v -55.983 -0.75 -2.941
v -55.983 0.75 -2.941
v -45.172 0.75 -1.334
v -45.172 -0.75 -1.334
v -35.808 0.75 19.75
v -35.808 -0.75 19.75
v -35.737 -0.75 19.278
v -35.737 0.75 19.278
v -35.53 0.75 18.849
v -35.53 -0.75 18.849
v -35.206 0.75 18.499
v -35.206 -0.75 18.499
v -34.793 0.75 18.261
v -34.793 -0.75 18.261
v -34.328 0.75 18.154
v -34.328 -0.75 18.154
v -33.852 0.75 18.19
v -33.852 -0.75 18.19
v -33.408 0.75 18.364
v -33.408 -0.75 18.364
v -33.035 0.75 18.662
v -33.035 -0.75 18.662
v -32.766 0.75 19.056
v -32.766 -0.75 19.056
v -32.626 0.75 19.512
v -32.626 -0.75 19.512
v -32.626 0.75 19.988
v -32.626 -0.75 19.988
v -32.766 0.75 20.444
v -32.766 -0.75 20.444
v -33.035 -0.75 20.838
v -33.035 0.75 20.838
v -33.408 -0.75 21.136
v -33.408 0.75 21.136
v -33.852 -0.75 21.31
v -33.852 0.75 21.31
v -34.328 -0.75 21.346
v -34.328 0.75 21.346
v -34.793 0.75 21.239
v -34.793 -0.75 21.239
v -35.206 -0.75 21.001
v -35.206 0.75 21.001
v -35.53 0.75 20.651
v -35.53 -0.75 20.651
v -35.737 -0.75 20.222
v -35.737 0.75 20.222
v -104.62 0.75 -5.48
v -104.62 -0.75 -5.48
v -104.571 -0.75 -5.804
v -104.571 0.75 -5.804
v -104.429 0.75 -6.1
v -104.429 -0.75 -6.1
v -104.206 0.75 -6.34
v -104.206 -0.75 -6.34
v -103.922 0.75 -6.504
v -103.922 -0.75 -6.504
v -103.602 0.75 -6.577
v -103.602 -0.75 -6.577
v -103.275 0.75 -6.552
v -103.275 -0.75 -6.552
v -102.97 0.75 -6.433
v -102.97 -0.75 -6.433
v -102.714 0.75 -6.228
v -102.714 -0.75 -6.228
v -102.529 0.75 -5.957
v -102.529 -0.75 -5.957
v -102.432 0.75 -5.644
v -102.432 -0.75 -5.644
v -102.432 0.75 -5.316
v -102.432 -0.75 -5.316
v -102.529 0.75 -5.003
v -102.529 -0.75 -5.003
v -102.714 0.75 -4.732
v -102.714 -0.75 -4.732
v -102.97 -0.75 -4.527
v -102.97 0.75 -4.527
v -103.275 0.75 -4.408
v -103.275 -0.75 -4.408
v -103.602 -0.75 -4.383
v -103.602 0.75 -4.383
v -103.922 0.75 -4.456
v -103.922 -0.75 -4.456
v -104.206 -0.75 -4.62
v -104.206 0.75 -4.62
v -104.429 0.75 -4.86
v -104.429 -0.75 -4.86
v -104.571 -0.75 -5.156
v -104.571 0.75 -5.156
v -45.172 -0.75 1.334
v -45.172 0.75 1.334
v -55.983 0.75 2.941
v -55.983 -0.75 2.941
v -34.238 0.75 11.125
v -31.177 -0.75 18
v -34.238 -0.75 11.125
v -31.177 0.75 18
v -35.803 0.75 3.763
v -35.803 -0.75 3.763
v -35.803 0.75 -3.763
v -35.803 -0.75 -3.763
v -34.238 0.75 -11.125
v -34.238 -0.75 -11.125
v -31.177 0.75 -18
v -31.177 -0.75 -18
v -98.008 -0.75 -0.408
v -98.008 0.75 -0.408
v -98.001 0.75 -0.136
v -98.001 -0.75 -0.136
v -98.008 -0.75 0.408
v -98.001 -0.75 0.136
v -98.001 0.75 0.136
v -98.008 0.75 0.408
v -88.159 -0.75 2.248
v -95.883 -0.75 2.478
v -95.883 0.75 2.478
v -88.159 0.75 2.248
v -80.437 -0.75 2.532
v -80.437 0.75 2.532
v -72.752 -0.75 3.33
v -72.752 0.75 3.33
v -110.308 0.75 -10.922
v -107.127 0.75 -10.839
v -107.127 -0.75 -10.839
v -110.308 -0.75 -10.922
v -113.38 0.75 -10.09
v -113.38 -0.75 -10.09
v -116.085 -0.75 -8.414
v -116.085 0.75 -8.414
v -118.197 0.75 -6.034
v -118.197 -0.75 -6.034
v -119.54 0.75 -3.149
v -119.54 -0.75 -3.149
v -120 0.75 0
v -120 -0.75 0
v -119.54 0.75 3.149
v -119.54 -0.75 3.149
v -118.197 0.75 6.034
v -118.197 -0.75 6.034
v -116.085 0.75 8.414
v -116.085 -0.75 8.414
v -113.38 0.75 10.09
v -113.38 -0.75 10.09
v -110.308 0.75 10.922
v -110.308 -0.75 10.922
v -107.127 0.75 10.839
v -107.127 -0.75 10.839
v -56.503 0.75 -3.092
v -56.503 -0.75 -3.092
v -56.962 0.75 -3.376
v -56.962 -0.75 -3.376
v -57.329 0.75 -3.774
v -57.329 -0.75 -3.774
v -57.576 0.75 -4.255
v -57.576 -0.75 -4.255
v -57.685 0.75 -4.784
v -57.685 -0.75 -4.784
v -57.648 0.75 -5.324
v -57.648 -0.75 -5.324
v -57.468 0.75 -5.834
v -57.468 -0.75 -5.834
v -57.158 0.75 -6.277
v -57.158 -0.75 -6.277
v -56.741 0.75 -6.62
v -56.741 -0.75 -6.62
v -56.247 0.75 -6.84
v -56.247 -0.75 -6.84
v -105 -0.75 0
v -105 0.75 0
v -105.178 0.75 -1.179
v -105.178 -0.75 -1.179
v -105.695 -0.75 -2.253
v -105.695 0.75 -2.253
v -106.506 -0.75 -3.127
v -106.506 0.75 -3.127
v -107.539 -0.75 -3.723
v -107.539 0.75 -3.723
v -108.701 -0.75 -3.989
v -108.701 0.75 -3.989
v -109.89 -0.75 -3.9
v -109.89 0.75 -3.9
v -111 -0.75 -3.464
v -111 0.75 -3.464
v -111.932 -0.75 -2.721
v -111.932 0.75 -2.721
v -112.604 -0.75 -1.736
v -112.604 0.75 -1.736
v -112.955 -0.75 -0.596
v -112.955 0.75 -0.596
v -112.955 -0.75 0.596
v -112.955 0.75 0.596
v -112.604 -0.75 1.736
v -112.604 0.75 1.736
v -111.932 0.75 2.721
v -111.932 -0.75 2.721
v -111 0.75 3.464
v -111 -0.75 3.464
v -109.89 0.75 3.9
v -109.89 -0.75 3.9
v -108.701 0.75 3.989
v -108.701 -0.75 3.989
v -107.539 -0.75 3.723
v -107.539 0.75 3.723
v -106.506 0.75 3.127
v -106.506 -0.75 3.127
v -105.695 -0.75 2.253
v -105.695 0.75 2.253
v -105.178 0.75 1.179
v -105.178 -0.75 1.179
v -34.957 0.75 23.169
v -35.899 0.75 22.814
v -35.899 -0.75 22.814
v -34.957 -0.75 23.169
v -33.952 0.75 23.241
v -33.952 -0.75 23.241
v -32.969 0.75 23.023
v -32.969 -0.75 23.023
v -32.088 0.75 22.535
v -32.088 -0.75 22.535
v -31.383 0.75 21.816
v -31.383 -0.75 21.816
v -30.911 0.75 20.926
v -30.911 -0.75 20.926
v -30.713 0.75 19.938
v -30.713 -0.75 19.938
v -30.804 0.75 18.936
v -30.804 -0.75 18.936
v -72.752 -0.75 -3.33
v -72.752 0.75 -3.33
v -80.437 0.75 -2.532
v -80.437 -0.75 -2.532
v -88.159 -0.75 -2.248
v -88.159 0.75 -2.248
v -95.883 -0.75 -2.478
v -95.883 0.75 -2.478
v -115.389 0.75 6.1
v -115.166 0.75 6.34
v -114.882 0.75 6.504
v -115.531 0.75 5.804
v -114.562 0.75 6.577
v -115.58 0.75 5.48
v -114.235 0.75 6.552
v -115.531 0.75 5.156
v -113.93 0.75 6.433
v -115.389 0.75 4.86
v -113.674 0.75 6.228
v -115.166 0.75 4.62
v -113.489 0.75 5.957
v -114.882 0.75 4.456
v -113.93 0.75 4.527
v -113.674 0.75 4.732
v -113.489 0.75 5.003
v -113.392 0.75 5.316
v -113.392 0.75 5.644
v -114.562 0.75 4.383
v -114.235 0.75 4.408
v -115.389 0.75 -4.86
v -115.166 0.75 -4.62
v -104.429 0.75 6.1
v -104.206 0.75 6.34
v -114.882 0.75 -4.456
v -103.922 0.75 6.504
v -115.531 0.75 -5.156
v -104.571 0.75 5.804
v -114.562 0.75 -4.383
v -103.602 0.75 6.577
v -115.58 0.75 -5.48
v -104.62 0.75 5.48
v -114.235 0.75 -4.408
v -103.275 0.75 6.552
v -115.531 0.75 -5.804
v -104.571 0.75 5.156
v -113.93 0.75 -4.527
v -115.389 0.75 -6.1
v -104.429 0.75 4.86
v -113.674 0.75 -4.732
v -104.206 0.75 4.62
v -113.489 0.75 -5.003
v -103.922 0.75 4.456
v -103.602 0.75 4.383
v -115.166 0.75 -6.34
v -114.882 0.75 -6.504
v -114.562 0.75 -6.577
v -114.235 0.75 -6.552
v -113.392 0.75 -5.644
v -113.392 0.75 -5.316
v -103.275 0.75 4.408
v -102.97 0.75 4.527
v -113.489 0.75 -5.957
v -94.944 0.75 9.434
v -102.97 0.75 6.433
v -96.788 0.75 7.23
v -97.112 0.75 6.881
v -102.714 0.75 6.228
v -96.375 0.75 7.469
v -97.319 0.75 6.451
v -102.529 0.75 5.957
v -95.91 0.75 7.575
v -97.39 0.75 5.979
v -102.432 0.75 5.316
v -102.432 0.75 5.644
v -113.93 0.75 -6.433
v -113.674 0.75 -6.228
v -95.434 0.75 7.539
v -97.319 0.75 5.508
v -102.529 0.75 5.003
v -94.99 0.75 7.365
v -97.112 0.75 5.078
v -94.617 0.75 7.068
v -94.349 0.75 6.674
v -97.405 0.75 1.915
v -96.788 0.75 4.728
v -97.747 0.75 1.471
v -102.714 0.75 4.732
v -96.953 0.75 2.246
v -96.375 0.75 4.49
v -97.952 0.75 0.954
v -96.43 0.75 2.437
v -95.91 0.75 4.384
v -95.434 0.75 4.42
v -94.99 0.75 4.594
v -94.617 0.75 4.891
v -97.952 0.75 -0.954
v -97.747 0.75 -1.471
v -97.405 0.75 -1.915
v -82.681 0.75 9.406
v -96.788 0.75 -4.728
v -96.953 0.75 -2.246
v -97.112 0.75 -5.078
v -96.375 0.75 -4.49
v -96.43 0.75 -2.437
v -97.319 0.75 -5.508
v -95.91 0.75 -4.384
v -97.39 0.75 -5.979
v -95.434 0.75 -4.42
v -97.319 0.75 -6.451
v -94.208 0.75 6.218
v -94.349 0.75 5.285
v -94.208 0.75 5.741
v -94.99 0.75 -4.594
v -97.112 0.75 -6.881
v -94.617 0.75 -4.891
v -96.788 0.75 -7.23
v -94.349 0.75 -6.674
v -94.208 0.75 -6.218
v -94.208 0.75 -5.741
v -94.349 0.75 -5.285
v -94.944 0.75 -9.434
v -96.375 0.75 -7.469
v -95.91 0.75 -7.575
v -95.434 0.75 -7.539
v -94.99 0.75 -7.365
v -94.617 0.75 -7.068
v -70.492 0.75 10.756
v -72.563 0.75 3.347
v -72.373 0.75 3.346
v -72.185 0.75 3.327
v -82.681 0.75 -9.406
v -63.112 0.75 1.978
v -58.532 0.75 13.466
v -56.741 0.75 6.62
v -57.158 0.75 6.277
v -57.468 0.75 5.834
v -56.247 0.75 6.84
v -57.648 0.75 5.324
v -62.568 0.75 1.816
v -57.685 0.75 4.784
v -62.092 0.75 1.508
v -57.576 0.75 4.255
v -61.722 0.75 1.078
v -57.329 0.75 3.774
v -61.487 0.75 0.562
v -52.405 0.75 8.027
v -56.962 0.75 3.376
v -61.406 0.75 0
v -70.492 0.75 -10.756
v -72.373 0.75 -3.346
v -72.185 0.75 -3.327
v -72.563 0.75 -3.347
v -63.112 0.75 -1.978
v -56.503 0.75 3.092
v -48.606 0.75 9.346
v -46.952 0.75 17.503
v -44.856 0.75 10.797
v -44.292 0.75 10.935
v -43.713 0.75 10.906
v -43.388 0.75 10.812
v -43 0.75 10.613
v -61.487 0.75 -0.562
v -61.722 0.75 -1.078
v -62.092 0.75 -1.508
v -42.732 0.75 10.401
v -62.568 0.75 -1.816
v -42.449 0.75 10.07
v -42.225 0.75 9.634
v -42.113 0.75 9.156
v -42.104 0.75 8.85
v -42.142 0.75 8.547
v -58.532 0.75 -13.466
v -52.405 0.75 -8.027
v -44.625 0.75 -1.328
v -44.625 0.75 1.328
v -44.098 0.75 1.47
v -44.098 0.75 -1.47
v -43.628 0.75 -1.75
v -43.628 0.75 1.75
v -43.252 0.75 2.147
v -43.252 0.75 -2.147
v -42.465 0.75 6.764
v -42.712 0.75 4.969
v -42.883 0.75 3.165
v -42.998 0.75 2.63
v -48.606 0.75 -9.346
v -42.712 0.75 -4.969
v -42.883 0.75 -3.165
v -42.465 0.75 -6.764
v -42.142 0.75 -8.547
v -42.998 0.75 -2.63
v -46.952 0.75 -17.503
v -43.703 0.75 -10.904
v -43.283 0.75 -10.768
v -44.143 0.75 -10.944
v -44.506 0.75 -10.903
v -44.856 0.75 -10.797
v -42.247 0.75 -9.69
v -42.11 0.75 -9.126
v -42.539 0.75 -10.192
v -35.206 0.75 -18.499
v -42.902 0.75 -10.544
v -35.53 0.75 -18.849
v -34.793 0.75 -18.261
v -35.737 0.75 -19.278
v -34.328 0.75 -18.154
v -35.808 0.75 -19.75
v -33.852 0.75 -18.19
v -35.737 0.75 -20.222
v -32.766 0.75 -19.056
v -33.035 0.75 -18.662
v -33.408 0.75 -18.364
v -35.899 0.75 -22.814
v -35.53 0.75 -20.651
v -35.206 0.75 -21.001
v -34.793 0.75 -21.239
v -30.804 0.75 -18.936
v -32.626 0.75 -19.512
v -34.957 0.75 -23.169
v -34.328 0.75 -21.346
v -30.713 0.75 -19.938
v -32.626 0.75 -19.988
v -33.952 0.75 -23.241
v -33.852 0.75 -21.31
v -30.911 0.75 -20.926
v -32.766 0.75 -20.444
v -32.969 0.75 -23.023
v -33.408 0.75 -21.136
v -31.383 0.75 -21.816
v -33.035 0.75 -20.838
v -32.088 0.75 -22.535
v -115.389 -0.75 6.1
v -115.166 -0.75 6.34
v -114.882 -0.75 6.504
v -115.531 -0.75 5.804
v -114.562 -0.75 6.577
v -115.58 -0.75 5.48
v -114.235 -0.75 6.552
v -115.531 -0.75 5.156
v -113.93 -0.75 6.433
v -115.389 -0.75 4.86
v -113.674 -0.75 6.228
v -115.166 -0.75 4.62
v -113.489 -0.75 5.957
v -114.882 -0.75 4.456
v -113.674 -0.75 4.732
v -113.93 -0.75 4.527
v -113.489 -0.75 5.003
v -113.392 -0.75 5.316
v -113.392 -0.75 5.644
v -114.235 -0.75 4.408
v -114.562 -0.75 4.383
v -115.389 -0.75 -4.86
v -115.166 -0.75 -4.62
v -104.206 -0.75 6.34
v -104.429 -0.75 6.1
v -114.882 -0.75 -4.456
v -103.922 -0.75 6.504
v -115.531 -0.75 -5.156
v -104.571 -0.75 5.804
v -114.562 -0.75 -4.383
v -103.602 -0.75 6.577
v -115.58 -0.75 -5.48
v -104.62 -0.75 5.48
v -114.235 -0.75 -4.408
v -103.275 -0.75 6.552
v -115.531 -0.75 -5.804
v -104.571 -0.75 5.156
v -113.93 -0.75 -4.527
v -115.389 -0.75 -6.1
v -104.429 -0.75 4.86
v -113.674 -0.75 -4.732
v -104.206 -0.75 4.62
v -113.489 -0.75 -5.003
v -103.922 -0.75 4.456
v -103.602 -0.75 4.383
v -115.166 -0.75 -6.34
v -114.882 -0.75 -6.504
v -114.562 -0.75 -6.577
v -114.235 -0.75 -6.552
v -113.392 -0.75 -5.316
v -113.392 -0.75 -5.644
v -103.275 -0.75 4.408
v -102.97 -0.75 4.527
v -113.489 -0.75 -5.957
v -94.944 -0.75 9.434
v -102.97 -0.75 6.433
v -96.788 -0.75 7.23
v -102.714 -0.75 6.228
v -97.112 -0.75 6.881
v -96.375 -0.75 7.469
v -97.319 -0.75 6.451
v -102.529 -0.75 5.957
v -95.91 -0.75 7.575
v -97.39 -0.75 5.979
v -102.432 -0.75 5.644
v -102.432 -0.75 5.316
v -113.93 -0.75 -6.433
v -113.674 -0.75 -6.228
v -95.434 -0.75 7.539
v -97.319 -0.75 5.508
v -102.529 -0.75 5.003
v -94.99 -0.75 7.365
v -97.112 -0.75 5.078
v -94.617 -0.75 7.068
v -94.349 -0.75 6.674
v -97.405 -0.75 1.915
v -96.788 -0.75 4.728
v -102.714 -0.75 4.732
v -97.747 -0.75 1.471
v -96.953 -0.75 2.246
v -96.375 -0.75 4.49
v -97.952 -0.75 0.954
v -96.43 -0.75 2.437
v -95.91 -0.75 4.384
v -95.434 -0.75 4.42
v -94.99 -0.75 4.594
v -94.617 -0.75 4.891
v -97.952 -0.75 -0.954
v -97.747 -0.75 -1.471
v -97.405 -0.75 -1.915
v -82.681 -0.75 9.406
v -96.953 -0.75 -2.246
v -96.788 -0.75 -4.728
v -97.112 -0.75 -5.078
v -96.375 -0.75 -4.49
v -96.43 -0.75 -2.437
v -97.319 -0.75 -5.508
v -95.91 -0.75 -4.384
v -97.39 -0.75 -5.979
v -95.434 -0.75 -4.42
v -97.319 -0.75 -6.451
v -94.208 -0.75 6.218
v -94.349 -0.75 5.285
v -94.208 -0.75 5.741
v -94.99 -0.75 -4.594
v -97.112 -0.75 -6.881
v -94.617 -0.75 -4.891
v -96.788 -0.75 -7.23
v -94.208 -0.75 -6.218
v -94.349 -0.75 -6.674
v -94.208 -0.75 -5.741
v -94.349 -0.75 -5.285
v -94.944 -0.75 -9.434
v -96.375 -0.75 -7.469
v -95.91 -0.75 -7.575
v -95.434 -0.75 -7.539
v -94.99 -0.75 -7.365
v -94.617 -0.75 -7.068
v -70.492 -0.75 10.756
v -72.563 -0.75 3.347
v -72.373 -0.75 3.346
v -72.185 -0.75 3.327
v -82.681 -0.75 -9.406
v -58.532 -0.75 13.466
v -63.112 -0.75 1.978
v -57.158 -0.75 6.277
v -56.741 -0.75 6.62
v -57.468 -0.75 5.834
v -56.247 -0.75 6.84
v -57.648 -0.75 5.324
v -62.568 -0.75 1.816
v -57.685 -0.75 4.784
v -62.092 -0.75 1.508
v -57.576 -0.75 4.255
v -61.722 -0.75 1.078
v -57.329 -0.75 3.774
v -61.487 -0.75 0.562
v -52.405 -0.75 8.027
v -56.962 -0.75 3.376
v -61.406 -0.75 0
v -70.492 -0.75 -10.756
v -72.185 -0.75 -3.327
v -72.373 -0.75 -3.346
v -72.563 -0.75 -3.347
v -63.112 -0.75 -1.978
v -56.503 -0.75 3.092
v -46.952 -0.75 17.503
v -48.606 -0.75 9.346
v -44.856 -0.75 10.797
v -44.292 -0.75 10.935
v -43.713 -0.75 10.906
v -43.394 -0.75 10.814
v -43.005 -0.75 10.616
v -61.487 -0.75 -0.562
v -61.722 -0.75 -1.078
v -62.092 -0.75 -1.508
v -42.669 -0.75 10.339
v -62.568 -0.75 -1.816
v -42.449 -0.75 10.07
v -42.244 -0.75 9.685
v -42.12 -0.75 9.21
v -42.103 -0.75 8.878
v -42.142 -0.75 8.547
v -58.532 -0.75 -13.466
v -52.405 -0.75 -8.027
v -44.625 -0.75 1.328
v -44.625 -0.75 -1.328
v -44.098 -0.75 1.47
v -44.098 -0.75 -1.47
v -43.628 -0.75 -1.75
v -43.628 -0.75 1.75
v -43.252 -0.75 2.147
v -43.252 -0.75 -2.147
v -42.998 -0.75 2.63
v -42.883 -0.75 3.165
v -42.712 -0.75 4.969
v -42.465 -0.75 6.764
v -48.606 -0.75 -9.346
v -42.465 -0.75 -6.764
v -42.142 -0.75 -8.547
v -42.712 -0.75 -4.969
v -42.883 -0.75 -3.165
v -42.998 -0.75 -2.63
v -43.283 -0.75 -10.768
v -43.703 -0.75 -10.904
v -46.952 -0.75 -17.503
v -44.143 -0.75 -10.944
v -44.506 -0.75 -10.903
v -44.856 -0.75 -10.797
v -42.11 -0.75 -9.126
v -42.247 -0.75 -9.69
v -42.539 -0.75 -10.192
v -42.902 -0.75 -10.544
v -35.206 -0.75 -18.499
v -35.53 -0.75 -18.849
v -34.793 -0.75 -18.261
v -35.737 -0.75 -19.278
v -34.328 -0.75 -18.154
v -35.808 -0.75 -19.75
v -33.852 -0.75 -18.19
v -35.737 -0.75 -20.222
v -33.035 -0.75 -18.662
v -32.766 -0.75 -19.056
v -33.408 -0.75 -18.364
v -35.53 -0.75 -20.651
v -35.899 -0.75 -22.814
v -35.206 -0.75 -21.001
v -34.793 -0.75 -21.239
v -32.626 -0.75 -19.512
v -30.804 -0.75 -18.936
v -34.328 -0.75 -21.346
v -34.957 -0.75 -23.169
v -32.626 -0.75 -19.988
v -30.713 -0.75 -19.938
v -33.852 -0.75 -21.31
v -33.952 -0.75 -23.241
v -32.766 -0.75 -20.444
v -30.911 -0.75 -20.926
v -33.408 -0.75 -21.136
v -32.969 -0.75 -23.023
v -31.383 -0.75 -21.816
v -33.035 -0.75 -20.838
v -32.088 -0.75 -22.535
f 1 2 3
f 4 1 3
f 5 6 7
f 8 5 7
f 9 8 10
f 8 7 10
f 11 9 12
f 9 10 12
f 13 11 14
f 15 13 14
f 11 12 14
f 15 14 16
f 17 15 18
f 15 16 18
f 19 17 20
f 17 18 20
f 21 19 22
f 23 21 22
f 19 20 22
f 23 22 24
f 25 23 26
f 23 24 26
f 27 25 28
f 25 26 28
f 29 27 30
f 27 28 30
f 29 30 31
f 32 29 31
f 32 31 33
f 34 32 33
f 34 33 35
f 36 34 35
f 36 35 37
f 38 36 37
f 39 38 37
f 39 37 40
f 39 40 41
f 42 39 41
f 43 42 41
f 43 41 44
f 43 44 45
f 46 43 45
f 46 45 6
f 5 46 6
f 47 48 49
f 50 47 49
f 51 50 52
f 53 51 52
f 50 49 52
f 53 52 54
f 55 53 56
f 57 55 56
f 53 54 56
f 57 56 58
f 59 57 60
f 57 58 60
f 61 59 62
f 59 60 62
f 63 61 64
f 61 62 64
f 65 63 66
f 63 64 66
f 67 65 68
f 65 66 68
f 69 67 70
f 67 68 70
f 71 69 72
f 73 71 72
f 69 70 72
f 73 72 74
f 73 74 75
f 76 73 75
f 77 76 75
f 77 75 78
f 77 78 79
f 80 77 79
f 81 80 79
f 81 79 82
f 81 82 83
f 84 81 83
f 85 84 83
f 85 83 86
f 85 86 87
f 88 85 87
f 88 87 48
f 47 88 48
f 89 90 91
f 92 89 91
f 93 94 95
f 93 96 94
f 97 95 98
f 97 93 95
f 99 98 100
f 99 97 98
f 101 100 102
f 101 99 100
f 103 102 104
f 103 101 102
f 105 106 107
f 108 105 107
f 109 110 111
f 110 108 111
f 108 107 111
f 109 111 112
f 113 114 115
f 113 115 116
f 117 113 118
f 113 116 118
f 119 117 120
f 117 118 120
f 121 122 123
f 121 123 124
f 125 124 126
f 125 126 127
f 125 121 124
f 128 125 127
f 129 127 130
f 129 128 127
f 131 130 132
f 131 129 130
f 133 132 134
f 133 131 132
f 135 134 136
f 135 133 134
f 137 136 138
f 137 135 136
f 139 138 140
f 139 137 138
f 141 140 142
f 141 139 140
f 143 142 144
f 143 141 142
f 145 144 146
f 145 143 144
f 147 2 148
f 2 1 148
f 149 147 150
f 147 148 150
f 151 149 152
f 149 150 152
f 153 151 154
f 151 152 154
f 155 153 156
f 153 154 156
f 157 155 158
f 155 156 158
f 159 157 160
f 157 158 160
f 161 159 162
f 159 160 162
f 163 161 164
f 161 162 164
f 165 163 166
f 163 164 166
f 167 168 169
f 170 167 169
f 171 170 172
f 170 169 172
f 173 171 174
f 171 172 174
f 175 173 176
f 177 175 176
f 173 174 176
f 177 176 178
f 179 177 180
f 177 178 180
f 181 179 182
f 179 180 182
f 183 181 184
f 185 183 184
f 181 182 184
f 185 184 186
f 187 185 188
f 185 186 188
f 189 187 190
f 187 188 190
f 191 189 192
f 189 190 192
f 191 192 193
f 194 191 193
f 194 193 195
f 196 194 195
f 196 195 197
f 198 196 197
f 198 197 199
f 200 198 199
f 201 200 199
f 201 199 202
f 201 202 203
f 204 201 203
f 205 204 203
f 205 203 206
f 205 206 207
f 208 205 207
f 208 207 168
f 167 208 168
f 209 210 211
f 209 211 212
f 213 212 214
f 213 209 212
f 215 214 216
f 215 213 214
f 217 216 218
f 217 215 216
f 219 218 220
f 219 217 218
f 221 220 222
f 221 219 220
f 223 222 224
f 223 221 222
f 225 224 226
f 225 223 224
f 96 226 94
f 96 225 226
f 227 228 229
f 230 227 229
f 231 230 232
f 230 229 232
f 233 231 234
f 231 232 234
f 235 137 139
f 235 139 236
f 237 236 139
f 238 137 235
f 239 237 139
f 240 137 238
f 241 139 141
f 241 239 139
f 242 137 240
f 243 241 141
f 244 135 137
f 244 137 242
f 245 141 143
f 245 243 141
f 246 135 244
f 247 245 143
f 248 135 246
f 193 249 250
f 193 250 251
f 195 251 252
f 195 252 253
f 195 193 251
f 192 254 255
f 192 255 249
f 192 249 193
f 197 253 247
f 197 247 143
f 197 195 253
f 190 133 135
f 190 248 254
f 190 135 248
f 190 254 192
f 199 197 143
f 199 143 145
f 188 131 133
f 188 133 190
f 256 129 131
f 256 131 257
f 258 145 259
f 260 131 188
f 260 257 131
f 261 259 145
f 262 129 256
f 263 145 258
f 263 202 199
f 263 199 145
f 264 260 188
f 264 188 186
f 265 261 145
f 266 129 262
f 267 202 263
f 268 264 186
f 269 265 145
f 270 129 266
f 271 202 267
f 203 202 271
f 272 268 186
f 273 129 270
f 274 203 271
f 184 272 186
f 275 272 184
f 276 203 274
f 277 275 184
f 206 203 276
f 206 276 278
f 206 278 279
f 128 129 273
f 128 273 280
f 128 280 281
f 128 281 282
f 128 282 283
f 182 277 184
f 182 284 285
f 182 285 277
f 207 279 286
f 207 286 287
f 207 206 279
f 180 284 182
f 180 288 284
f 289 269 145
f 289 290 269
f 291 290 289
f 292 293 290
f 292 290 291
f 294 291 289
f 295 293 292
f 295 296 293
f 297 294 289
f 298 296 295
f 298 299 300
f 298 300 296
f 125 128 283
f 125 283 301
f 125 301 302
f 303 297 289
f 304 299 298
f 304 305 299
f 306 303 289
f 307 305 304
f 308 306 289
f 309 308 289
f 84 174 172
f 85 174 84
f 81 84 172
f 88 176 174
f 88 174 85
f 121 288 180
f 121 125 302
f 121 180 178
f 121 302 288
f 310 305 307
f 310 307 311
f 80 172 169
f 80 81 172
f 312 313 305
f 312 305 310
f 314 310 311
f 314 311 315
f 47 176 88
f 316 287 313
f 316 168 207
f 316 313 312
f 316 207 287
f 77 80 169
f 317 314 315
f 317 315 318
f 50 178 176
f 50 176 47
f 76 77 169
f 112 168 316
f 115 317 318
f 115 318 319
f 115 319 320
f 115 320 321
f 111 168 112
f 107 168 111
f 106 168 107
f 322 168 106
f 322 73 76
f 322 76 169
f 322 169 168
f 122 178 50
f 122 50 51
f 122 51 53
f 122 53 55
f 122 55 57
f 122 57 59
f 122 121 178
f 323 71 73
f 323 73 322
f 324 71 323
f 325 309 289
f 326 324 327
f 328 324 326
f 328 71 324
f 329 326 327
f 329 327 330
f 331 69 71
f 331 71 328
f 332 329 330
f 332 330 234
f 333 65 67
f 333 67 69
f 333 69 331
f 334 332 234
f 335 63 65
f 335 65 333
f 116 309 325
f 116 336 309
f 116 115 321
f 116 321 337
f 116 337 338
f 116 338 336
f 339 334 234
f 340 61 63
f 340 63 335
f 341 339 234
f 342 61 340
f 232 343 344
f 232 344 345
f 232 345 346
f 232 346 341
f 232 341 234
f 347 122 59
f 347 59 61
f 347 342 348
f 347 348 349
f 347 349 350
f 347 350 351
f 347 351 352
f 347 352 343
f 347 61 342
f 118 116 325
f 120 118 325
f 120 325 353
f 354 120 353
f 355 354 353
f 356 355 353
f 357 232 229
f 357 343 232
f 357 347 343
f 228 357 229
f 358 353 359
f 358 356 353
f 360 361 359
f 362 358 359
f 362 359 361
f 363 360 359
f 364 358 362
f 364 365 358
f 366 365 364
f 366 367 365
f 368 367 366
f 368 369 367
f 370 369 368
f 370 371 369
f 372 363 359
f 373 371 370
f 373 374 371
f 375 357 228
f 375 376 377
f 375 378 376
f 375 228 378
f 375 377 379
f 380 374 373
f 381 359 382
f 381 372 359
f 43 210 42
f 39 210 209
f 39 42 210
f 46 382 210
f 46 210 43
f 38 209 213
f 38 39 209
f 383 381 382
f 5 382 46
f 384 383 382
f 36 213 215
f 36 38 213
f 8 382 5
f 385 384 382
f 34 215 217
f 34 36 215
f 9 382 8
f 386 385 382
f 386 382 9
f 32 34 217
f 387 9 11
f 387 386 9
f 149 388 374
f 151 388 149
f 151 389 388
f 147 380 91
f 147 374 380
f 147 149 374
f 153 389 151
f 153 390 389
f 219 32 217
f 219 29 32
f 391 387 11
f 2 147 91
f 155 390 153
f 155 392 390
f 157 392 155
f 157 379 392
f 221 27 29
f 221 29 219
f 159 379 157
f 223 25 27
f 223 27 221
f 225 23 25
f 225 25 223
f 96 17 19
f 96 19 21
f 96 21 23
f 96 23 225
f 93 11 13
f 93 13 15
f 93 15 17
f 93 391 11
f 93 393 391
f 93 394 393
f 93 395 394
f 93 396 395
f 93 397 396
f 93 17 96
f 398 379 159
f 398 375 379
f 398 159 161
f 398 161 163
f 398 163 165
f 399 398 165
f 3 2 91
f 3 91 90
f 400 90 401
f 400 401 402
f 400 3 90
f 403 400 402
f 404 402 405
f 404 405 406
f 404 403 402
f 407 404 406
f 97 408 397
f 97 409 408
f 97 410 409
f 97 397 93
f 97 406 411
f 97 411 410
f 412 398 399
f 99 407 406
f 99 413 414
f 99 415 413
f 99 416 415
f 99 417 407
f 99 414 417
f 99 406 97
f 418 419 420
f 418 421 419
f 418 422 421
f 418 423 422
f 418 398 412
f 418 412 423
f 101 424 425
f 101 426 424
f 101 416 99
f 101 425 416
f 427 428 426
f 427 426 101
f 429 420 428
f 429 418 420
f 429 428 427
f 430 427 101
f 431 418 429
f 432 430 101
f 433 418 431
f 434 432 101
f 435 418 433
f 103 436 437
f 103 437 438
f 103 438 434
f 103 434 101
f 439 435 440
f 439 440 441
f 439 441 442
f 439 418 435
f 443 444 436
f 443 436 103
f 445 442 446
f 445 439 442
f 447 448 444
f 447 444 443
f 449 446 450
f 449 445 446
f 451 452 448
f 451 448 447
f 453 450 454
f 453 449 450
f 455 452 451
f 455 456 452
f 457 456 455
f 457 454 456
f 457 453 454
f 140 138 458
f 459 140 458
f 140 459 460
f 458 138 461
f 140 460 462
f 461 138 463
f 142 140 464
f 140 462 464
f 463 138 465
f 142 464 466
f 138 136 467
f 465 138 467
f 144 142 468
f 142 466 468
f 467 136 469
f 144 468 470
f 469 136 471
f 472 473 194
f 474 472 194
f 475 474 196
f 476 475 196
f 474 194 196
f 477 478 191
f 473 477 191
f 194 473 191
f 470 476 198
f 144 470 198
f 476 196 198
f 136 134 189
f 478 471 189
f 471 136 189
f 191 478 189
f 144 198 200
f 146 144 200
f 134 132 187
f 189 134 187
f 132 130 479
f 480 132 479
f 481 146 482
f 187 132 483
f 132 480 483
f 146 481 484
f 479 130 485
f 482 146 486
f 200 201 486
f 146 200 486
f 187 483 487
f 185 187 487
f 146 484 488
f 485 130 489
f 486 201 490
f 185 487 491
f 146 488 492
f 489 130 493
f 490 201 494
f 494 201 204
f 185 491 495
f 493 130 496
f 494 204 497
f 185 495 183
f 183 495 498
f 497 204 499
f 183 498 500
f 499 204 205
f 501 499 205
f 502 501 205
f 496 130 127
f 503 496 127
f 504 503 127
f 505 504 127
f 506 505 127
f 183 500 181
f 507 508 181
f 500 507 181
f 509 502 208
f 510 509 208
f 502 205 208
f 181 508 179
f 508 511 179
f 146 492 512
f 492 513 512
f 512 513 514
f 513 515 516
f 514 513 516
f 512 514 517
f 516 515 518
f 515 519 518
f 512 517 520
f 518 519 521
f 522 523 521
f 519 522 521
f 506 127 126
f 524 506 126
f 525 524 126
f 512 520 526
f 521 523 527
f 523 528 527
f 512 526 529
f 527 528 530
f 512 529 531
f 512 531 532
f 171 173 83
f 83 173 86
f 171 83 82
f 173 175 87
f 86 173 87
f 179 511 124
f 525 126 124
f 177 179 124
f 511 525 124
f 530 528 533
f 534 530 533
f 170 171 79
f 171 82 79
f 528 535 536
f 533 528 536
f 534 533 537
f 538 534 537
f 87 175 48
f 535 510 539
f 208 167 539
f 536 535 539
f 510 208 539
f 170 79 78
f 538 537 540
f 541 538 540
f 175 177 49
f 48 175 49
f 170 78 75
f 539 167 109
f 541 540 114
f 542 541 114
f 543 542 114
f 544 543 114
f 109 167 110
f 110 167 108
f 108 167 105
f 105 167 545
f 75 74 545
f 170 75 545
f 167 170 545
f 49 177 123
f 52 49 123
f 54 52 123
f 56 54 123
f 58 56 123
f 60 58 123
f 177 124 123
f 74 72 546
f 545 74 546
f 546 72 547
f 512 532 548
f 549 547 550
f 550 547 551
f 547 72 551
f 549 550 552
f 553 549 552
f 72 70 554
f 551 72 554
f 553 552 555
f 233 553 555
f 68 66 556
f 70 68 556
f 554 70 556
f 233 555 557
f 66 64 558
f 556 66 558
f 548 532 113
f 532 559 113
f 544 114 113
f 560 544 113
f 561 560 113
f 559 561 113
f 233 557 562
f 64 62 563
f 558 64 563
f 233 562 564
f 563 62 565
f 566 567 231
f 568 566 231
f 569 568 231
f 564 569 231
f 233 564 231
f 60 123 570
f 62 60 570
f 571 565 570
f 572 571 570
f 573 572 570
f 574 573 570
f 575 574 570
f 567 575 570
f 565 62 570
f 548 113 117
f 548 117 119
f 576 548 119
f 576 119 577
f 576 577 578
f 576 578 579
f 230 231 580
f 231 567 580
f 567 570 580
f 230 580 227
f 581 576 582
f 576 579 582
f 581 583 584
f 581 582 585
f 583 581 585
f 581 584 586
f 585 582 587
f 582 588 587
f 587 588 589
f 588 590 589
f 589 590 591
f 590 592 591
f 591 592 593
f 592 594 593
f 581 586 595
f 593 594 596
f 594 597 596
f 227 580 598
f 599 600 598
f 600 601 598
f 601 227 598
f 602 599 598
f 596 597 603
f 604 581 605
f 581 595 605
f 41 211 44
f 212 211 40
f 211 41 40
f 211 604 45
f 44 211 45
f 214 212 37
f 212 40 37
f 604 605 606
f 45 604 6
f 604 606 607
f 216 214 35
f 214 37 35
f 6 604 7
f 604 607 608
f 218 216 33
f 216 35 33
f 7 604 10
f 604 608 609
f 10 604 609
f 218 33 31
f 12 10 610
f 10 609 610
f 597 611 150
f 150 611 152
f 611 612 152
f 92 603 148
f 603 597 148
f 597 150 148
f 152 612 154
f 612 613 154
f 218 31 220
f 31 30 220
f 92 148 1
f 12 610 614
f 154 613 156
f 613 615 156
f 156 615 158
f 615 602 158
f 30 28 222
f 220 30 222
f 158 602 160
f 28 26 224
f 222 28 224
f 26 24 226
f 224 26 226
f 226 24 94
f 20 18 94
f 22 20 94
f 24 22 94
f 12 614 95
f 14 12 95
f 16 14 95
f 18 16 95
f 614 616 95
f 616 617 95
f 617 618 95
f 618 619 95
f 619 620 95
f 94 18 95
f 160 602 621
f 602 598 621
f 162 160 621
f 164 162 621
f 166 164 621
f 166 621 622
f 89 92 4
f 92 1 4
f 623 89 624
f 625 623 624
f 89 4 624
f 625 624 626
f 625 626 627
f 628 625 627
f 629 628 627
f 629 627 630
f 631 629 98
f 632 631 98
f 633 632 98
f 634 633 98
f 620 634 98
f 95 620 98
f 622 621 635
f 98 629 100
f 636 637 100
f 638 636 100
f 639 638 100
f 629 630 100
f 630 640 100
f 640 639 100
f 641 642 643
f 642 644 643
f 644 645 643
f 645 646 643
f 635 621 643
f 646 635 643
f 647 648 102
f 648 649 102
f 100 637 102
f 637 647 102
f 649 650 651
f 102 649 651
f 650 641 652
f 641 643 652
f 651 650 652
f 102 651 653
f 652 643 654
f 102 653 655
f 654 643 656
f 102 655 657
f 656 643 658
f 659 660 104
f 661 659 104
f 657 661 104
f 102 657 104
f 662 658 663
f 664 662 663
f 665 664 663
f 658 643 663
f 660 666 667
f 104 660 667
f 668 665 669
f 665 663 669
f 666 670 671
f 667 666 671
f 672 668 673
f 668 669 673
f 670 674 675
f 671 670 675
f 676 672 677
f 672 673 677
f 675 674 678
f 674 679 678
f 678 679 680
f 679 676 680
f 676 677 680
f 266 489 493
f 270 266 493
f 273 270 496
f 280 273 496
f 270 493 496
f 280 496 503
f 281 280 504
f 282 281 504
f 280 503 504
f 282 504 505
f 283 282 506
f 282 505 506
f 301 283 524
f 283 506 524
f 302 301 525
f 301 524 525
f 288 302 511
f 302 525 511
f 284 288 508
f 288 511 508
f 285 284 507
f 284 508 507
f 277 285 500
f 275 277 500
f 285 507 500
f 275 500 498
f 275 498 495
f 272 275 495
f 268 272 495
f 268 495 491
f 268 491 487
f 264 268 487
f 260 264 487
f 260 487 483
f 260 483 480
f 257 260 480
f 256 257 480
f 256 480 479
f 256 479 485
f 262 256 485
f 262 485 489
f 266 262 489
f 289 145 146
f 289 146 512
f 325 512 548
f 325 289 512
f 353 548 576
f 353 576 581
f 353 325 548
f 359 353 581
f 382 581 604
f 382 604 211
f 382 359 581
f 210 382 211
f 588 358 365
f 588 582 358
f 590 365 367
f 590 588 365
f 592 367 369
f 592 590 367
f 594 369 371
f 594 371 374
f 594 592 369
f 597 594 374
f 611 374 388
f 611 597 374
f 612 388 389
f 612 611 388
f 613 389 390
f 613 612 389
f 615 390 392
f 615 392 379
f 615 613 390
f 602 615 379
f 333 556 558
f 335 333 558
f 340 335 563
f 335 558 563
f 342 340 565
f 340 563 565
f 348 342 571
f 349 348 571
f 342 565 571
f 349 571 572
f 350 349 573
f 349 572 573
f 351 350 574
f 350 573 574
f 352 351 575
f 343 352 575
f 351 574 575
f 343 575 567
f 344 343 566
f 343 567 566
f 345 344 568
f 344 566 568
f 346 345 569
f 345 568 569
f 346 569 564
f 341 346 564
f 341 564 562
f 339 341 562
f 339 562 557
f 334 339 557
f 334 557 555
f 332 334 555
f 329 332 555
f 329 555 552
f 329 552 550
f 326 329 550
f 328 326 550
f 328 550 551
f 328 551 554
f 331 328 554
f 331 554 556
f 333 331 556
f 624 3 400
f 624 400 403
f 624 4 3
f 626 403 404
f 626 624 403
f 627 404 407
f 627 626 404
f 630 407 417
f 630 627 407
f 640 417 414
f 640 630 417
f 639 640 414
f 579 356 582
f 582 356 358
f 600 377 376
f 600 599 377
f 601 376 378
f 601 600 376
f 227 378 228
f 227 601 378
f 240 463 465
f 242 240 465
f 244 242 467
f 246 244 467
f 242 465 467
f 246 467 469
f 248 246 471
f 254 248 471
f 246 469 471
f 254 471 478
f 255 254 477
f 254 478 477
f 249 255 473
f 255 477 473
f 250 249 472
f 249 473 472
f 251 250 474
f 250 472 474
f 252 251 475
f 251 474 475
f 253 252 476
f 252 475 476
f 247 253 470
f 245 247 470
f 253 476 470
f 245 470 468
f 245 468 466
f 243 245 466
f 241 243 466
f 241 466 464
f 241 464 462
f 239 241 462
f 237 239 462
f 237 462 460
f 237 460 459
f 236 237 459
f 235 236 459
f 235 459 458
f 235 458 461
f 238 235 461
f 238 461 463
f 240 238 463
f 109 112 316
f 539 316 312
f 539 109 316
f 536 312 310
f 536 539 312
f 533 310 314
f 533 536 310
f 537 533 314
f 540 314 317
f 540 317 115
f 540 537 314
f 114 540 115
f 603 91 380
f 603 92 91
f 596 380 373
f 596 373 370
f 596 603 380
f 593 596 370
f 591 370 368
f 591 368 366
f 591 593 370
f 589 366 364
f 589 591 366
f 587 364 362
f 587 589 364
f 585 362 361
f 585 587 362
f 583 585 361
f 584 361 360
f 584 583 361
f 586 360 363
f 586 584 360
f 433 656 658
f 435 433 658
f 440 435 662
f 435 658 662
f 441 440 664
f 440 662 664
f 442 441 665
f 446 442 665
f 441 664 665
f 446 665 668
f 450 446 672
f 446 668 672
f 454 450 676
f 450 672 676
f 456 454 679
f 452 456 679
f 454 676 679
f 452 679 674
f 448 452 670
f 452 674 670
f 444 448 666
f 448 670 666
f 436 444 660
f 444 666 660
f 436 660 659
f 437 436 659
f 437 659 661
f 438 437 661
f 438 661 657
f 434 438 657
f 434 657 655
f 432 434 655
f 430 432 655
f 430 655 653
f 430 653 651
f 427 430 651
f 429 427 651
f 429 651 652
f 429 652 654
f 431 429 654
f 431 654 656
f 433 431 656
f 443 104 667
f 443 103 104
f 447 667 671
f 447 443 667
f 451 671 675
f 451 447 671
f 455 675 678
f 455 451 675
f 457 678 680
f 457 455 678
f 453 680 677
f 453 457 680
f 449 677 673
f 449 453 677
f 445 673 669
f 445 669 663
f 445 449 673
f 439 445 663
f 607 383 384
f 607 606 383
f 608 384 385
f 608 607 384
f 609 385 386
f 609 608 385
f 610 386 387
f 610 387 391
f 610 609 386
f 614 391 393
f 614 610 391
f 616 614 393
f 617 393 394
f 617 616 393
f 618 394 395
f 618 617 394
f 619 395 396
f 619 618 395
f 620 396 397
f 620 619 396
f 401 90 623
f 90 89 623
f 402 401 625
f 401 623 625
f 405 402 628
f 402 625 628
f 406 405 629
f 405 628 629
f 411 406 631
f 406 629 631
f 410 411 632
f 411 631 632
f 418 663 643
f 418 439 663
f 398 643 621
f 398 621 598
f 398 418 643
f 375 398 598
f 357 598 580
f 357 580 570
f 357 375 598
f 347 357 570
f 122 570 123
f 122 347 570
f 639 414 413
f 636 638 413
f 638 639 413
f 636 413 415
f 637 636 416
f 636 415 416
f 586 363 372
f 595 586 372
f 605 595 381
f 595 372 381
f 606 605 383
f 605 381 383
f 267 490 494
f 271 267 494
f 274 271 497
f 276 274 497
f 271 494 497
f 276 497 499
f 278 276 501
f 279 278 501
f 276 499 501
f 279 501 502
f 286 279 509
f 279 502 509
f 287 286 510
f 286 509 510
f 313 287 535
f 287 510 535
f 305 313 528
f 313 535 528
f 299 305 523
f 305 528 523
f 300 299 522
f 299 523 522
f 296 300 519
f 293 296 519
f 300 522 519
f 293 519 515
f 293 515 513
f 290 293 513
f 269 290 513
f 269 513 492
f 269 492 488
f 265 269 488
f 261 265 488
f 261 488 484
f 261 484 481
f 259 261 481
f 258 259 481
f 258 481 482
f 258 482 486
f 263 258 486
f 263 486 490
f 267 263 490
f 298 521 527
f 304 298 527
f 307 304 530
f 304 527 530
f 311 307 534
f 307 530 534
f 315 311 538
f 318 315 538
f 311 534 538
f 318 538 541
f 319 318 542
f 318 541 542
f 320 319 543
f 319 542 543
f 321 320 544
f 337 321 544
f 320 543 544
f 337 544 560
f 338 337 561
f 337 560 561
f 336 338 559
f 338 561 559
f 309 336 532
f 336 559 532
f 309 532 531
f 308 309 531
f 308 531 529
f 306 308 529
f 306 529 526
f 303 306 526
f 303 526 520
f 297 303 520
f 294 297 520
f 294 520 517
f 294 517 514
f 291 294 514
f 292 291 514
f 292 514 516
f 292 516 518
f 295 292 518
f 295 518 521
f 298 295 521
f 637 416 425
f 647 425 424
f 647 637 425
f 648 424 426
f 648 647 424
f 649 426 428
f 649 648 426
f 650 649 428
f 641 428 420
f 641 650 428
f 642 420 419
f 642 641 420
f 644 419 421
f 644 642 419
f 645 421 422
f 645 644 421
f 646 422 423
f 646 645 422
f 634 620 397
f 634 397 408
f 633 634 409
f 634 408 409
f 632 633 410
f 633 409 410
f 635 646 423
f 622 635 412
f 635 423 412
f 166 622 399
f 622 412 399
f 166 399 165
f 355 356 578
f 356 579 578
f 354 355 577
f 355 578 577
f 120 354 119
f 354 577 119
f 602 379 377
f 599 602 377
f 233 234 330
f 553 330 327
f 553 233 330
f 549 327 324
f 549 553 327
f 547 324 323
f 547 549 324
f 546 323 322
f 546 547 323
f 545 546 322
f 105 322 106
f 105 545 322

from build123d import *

# Parameters (mm, degrees)
SKETCH1_R                      = 3.5
BOSS_EXTRUDE1_DEPTH            = 0.75
F_2_2_2_2_DIAMETER_HOLE1_D     = 2.2
F_3_2_3_2_DIAMETER_HOLE1_D     = 3.2
F_3_2_3_2_DIAMETER_HOLE1_DEPTH = 10
F_3_2_3_2_DIAMETER_HOLE1_TIP   = 0.96137699
CUT_EXTRUDE1_DEPTH             = 2.5
FILLET1_R                      = 2
SKETCH7_R                      = 4
CUT_EXTRUDE2_DEPTH             = 2.5000001


with BuildPart() as part:
    # Sketch1 → Boss-Extrude1 (new body, symmetric)
    with BuildSketch(Plane(origin=(0, 0, 0), x_dir=(1, 0, 0), z_dir=(0, 1, 0))):
        with BuildLine():
            ThreePointArc((-37.239092363, -21.5), (-43, 0), (-37.239092363, 21.5))
            ThreePointArc((-37.239092363, 21.5), (-36.658838331, 22.248681329), (-35.899079455, 22.81435343))
            ThreePointArc((-35.899079455, 22.81435343), (-70.492179883, 10.7556392), (-107.126701642, 10.839315166))
            ThreePointArc((-107.126701642, 10.839315166), (-120, 0), (-107.126701642, -10.839315166))
            ThreePointArc((-107.126701642, -10.839315166), (-70.492179883, -10.7556392), (-35.899079455, -22.81435343))
            ThreePointArc((-35.899079455, -22.81435343), (-36.658838331, -22.248681329), (-37.239092363, -21.5))
        make_face()
        with BuildLine():
            ThreePointArc((-31.176914536, 18), (-35.958003449, 16.718911087), (-37.239092363, 21.5))
            ThreePointArc((-37.239092363, 21.5), (-43, 0), (-37.239092363, -21.5))
            ThreePointArc((-37.239092363, -21.5), (-35.958003449, -16.718911087), (-31.176914536, -18))
            ThreePointArc((-31.176914536, -18), (-36, 0), (-31.176914536, 18))
        make_face()
        with Locations((-34.208003449, -19.75)):
            Circle(SKETCH1_R)
        with Locations((-34.208003449, 19.75)):
            Circle(SKETCH1_R)
    extrude(amount=BOSS_EXTRUDE1_DEPTH, both=True)

    # Ø2.2 (2.2) Diameter Hole1 (through all)
    with Locations(Plane(origin=(0, 0.75, 0), x_dir=(1, 0, 0), z_dir=(0, 1, 0))):
        with Locations((-114.480077554, 5.480077554), (-103.519922446, 5.480077554), (-103.519922446, -5.480077554), (-114.480077554, -5.480077554)):
            Hole(F_2_2_2_2_DIAMETER_HOLE1_D / 2)

    # Ø3.2 (3.2) Diameter Hole1
    with Locations(Plane(origin=(0, 0.75, 0), x_dir=(1, 0, 0), z_dir=(0, 1, 0))):
        with Locations((-34.208003449, 19.75), (-34.208003449, -19.75), (-95.790276336, 5.979398024), (-95.790276336, -5.979398024)):
            Hole(F_3_2_3_2_DIAMETER_HOLE1_D / 2, depth=F_3_2_3_2_DIAMETER_HOLE1_DEPTH)
            with Locations((0, 0, -(F_3_2_3_2_DIAMETER_HOLE1_DEPTH + F_3_2_3_2_DIAMETER_HOLE1_TIP / 2))):  # 118° drill point
                Cone(0, F_3_2_3_2_DIAMETER_HOLE1_D / 2, F_3_2_3_2_DIAMETER_HOLE1_TIP, mode=Mode.SUBTRACT)

    # Sketch6 → Cut-Extrude1 (cut, through all)
    with BuildSketch(Plane(origin=(0, 0.75, 0), x_dir=(1, 0, 0), z_dir=(0, 1, 0))):
        with BuildLine():
            Line((-72.469338063, -3.369046694), (-49.802019621, 0))
            Line((-49.802019621, 0), (-72.469338063, 3.369046694))
            ThreePointArc((-72.469338063, 3.369046694), (-85.377857375, 2.290839769), (-98.326107181, 2.65857332))
            ThreePointArc((-98.326107181, 2.65857332), (-98, 0), (-98.326107181, -2.65857332))
            ThreePointArc((-98.326107181, -2.65857332), (-85.377857375, -2.290839769), (-72.469338063, -3.369046694))
        make_face()
        with BuildLine():
            Line((-66.096117167, 4.443764231), (-42.988154947, 1.009224591))
            ThreePointArc((-42.988154947, 1.009224591), (-42.467311238, 6.747405149), (-41.183985346, 12.36443897))
            ThreePointArc((-41.183985346, 12.36443897), (-53.416219701, 7.70010587), (-66.096117167, 4.443764231))
        make_face()
        with BuildLine():
            ThreePointArc((-41.183985346, -12.36443897), (-42.467311238, -6.747405149), (-42.988154947, -1.009224591))
            Line((-42.988154947, -1.009224591), (-66.096117167, -4.443764231))
            ThreePointArc((-66.096117167, -4.443764231), (-53.416219701, -7.70010587), (-41.183985346, -12.36443897))
        make_face()
    extrude(amount=-CUT_EXTRUDE1_DEPTH, mode=Mode.SUBTRACT)

    # Fillet1
    fillet1_edges = [part.edges().sort_by_distance(p)[0] for p in [
        (-42.988154947, 0, 1.009224591),
        (-41.183985346, 0, 12.36443897),
        (-66.096117167, 0, 4.443764231),
        (-98.326107181, 0, 2.65857332),
        (-98.326107181, 0, -2.65857332),
        (-72.469338063, 0, -3.369046694),
        (-49.802019621, 0, 0),
        (-72.469338063, 0, 3.369046694),
        (-41.183985346, 0, -12.36443897),
        (-42.988154947, 0, -1.009224591),
        (-66.096117167, 0, -4.443764231),
    ]]
    fillet(fillet1_edges, radius=FILLET1_R)

    # Sketch7 → Cut-Extrude2 (cut, through all)
    with BuildSketch(Plane(origin=(0, 0.75, 0), x_dir=(1, 0, 0), z_dir=(0, 1, 0))):
        with Locations((-109, 0)):
            Circle(SKETCH7_R)
    extrude(amount=-CUT_EXTRUDE2_DEPTH, mode=Mode.SUBTRACT)


solid = part.part
